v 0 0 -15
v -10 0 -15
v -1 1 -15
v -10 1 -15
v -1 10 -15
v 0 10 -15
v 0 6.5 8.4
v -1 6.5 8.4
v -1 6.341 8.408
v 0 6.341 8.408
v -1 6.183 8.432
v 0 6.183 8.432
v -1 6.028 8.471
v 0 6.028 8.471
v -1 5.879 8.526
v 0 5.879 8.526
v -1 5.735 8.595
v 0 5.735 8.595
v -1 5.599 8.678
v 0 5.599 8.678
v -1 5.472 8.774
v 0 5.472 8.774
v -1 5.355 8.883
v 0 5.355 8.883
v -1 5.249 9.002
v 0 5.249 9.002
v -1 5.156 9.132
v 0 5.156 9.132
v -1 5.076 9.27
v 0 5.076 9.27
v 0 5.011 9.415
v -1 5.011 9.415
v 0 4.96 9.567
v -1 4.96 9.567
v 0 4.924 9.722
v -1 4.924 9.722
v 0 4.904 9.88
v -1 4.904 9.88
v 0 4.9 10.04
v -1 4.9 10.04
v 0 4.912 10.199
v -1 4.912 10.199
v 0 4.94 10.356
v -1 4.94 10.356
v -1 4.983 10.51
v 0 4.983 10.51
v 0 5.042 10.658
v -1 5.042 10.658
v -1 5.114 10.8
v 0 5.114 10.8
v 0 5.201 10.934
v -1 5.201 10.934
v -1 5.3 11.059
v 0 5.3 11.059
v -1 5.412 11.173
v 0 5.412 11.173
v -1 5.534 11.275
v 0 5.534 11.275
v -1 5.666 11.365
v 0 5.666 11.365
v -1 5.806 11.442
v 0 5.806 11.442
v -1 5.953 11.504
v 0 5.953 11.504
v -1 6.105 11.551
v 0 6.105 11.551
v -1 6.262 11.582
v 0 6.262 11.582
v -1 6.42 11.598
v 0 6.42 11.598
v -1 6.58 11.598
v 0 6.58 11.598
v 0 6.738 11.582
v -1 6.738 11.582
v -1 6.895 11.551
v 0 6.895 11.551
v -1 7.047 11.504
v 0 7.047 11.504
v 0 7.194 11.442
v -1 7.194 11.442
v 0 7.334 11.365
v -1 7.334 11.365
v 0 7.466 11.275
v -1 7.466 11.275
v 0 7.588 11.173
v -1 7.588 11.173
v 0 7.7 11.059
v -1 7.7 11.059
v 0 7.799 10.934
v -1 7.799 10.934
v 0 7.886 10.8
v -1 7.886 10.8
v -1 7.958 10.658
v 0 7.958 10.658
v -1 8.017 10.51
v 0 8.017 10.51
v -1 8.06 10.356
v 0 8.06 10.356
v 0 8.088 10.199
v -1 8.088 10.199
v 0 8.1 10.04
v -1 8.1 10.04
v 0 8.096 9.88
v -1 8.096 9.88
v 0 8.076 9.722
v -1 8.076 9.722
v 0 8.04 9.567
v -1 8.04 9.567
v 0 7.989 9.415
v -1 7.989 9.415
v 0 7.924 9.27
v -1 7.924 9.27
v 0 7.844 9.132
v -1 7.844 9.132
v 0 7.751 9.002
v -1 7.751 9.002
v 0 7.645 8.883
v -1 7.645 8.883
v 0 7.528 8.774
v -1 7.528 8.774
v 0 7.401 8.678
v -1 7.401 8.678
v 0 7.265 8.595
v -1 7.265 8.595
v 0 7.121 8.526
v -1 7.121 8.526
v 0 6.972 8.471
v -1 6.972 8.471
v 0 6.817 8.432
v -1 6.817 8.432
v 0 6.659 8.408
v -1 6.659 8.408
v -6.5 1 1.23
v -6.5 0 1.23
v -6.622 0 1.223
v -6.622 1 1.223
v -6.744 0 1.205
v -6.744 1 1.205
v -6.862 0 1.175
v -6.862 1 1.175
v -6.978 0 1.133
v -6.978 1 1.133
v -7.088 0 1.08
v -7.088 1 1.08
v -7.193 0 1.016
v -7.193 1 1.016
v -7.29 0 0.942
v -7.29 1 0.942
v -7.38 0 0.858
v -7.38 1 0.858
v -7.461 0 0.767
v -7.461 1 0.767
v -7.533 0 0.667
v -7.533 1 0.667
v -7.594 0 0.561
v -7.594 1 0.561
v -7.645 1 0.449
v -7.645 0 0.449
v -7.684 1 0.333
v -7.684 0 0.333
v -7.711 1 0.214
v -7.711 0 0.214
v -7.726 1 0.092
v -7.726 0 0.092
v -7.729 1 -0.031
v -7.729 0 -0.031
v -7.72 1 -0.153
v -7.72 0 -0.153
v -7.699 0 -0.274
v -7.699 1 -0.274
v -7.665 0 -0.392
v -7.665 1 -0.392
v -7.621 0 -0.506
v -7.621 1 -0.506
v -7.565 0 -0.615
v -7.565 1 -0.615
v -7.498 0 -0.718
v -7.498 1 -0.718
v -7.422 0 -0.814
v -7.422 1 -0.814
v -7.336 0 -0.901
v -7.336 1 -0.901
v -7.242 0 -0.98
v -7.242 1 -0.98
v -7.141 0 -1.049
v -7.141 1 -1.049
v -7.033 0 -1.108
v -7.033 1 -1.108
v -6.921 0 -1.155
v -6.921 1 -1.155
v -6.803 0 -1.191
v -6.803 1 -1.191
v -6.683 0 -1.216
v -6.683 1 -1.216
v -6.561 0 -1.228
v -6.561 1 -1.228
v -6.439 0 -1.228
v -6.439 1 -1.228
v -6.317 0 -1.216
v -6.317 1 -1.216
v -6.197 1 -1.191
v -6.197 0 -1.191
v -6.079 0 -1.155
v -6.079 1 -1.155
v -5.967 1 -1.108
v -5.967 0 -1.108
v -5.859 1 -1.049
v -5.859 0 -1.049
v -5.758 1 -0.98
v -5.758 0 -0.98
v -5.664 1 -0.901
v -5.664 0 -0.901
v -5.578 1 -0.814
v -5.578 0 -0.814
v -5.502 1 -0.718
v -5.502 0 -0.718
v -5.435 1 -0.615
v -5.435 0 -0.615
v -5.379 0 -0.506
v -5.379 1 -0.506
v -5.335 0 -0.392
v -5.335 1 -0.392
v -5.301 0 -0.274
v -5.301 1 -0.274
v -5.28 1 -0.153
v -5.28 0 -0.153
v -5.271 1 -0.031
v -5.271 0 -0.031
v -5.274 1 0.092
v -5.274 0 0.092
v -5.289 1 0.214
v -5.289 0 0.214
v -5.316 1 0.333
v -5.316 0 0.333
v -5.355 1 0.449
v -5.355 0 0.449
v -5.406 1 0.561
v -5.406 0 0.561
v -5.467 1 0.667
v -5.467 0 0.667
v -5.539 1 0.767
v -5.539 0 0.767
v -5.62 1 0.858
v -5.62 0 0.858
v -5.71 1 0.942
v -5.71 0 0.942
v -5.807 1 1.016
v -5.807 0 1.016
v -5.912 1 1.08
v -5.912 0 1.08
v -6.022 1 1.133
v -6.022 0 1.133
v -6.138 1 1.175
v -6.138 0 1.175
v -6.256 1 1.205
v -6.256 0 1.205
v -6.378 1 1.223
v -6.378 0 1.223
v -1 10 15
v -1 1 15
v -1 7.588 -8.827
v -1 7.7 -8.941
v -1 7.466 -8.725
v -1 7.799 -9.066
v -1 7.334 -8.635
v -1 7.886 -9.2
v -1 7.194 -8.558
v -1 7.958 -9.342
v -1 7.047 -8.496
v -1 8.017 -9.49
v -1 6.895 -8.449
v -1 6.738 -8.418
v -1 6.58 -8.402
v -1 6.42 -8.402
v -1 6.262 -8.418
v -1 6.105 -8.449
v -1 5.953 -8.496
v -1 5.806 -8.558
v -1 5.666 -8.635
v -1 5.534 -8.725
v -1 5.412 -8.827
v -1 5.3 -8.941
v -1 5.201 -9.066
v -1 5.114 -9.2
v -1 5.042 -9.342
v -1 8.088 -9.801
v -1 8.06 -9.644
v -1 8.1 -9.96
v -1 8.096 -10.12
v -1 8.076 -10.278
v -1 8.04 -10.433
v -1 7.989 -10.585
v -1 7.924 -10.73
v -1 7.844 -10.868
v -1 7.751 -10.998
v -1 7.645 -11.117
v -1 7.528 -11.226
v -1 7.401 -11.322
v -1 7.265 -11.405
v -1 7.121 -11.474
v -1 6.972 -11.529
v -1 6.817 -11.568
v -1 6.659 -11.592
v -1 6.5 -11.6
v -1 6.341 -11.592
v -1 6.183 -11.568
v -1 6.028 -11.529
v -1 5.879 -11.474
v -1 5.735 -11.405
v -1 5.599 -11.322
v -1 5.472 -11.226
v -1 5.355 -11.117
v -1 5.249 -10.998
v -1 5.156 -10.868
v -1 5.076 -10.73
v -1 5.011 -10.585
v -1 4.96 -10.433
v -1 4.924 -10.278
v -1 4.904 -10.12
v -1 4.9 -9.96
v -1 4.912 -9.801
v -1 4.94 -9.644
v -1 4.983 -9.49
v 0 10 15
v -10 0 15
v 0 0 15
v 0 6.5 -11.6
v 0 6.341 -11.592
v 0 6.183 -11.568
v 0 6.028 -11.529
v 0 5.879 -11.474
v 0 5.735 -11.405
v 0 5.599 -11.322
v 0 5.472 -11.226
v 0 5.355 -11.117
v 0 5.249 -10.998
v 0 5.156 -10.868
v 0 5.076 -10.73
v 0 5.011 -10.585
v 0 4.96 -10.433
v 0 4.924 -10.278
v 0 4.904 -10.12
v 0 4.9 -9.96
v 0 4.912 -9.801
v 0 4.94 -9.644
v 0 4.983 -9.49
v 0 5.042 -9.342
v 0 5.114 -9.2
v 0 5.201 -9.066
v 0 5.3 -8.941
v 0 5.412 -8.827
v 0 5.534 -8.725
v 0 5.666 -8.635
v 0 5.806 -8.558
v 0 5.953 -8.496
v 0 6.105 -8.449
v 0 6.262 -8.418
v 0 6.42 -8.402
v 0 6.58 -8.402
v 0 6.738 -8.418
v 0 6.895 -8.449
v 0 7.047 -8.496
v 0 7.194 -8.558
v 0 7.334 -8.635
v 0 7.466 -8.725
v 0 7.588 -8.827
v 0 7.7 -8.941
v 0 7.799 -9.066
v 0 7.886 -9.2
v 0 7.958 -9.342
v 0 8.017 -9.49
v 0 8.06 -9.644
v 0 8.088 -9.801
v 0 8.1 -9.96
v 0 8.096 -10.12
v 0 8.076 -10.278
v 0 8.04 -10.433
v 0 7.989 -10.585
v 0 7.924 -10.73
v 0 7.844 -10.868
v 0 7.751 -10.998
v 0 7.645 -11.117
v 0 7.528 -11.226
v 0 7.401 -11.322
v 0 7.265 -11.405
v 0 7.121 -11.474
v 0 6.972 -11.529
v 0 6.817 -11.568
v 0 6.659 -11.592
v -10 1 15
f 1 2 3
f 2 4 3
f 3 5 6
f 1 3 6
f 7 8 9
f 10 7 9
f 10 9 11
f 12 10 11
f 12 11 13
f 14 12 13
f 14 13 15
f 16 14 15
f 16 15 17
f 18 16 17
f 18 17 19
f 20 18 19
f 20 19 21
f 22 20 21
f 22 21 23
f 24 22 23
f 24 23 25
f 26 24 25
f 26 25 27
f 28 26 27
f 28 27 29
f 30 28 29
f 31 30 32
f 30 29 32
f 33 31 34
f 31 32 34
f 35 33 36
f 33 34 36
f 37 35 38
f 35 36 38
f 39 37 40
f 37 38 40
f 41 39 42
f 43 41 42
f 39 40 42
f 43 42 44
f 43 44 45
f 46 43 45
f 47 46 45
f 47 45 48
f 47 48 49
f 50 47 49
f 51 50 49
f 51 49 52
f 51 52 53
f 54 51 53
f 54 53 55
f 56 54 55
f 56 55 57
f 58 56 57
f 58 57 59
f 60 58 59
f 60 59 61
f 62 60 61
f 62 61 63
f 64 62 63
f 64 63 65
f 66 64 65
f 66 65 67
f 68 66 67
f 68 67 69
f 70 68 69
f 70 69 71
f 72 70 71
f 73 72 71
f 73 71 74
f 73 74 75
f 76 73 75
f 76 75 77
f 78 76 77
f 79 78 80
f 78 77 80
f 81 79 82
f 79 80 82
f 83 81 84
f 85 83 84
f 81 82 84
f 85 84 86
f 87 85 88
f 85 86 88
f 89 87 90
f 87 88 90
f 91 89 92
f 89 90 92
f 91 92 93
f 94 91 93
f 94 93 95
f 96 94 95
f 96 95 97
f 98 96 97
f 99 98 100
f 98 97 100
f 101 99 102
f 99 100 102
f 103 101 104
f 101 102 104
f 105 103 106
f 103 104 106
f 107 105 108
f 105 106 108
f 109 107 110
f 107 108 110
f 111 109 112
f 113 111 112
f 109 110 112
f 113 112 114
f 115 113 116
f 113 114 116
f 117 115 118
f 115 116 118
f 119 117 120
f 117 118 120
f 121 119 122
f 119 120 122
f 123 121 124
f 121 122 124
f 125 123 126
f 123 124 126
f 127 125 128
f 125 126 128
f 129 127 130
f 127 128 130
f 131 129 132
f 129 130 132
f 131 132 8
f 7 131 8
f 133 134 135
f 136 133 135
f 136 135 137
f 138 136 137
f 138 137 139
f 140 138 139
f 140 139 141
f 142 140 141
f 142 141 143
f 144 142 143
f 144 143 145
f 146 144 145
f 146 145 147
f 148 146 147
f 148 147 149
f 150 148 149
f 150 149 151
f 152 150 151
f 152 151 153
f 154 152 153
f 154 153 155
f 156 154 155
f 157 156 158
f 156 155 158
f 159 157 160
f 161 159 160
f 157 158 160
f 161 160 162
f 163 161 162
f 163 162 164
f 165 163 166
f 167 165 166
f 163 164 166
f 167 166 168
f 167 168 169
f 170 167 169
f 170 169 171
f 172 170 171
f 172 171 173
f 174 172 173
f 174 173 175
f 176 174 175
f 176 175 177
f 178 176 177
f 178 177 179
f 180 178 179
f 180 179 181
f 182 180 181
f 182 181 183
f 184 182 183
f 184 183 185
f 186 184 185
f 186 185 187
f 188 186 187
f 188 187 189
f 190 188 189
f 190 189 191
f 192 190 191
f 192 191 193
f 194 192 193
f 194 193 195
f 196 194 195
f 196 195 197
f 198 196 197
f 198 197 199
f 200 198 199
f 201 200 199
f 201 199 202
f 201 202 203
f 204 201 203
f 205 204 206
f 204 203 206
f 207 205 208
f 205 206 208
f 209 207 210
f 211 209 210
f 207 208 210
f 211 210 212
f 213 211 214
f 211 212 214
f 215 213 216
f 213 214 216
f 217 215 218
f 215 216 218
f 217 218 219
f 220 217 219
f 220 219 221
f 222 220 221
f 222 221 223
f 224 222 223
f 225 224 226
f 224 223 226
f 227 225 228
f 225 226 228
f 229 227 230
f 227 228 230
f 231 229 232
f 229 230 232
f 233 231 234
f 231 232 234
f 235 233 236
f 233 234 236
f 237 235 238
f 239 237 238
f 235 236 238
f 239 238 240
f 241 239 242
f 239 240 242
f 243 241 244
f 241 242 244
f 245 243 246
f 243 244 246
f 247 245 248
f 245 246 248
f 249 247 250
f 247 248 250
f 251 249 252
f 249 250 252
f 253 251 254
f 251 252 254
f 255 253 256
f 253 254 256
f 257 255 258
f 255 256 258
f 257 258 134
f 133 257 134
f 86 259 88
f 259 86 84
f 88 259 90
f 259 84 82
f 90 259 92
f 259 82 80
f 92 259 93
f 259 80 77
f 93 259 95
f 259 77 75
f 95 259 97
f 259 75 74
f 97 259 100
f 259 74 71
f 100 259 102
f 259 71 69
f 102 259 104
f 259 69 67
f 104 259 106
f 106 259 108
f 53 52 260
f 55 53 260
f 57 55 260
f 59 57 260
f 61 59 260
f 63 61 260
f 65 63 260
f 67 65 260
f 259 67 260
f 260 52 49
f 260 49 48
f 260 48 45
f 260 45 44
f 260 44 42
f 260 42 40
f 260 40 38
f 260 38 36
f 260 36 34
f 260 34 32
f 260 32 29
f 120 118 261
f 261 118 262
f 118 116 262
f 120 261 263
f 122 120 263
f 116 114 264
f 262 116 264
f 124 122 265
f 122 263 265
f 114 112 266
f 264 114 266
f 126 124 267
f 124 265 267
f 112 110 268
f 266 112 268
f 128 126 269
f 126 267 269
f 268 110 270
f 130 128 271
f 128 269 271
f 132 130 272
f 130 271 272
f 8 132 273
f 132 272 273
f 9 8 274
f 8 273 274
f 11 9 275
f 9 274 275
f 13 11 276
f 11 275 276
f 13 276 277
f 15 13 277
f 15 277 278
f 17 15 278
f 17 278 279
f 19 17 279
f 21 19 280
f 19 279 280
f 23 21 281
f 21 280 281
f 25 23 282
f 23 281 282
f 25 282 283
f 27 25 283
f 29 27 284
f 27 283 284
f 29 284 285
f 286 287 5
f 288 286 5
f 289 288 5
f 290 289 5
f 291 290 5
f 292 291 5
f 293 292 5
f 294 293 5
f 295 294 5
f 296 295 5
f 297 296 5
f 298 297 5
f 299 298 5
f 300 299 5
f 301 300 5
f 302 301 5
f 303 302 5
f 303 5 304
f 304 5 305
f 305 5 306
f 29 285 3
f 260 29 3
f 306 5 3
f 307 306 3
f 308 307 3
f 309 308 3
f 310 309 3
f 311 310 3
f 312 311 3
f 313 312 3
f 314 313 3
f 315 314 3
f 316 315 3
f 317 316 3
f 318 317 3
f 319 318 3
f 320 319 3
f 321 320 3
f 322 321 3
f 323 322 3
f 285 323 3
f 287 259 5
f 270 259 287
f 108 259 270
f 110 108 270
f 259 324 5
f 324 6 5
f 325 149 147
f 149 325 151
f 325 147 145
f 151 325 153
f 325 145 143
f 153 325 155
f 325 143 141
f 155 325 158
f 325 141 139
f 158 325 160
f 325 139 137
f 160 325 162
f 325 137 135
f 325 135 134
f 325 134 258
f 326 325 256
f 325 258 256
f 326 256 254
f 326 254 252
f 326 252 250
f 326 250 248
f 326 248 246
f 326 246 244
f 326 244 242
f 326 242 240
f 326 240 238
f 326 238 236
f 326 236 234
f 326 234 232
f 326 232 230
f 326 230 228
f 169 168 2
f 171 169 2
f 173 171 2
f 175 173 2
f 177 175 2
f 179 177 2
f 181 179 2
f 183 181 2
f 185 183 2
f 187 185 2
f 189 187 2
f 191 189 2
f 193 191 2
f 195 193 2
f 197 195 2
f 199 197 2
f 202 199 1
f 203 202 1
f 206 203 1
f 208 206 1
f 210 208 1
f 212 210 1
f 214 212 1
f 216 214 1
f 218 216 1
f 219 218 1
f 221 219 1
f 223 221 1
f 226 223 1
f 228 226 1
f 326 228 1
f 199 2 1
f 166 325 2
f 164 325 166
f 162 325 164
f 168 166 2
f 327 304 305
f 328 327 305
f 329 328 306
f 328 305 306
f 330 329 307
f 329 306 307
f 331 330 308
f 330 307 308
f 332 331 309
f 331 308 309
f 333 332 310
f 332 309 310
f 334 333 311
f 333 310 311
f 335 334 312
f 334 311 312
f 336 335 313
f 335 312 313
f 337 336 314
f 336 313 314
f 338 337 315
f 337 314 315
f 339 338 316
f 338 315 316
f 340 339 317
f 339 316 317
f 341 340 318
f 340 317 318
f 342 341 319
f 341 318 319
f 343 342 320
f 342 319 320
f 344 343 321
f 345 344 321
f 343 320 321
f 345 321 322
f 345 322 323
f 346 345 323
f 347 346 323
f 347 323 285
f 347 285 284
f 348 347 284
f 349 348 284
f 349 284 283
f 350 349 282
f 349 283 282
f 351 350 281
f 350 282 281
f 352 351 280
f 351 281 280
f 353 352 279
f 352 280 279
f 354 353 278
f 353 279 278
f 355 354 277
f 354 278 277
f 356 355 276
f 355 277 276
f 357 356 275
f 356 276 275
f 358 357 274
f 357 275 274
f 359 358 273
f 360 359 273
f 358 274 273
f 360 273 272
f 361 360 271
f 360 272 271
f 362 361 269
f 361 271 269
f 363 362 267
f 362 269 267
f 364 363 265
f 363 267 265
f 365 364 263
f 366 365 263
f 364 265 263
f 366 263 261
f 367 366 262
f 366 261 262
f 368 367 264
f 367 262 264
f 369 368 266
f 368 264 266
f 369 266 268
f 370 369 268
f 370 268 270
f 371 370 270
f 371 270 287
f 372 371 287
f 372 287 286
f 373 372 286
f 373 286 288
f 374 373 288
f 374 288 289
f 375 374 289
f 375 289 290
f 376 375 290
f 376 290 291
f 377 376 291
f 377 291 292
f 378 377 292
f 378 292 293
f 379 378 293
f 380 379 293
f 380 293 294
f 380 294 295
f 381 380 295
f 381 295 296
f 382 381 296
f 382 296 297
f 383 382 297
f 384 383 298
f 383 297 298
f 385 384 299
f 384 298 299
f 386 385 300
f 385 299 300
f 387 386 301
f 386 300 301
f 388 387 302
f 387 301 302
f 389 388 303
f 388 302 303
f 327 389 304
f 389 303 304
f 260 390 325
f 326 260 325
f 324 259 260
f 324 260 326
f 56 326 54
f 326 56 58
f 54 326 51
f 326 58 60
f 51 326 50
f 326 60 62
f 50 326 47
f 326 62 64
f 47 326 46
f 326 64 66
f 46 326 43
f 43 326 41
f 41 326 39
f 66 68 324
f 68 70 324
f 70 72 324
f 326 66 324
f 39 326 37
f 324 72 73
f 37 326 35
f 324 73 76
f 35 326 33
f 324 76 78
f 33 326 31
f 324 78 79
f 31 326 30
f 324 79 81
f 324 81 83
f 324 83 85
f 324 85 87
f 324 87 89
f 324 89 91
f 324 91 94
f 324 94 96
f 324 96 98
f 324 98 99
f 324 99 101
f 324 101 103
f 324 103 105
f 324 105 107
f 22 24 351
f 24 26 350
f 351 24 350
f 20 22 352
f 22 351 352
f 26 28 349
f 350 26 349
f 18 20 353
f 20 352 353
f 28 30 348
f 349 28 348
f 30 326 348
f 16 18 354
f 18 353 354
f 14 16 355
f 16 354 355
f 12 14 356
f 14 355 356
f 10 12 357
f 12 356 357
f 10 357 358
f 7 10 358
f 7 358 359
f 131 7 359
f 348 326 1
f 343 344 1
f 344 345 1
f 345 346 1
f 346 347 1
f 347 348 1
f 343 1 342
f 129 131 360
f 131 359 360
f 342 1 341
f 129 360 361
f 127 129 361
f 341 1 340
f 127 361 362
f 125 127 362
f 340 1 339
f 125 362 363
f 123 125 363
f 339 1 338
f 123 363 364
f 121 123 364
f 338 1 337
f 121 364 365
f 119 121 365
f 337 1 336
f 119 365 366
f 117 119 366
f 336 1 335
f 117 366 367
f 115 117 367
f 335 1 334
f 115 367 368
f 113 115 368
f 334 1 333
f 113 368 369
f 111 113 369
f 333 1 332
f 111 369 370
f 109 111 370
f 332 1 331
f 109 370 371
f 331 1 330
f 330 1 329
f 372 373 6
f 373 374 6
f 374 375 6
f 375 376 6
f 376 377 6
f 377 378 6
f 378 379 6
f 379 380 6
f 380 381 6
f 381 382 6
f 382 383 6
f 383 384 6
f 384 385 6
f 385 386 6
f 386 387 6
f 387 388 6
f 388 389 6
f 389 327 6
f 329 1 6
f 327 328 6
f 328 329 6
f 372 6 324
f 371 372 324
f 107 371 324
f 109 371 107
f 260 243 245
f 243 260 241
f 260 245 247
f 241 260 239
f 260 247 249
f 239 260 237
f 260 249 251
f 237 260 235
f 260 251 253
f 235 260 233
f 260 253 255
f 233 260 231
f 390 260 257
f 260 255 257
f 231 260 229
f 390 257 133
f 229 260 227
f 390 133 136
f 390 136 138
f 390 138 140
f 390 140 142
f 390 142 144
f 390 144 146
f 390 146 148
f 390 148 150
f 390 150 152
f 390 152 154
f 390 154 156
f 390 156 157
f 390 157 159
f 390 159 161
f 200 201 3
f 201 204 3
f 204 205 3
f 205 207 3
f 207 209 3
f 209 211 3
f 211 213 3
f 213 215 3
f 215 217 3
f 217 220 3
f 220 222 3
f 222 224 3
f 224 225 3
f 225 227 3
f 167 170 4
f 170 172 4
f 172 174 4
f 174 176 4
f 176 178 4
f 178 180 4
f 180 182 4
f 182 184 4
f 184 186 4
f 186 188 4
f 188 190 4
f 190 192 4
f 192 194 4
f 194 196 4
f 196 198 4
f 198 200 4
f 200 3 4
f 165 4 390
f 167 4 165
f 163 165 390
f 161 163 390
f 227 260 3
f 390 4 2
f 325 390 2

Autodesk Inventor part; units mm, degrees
ref_plane "YZ Plane" through (0, 0, 0) normal (1, 0, 0) x (0, 1, 0)
ref_plane "XZ Plane" through (0, 0, 0) normal (0, 1, 0) x (-1, 0, 0)
ref_plane "XY Plane" through (0, 0, 0) normal (0, 0, 1) x (1, 0, 0)
sketch "Náčrt1" plane through (0, 0, 0) normal (0, 0, 1) x (1, 0, 0)
  line L0 (-10, 0) -> (0, 0)
  line L1 (0, 0) -> (0, 10)
  line L2 (0, 10) -> (-1, 10)
  line L3 (-1, 10) -> (-1, 1)
  line L4 (-1, 1) -> (-10, 1)
  line L5 (-10, 1) -> (-10, 0)
  line L6 (0, 12) -> (0, -2) projected
  line L7 (-12, 0) -> (2, 0) projected
  point P0 (0, 0)
  dimension "d0" = 10
  dimension "d1" = 10
  dimension "d2" = 1
  dimension "d3" = 1
extrude "Vysunutí1" add sketch "Náčrt1" along normal mid plane 30
sketch "Náčrt2" plane through (0, 0, 15) normal (1, 0, 0) x (0, 0, -1)
  line L0 (30, 10) -> (0, 10) projected
  line L1 (30, 10) -> (30, 0) projected
  point P0 (15, 0)
  point P1 (5, 6.5)
  point P2 (25, 6.5)
  point P3 (30, 5)
  dimension "d6" = 3.5
  dimension "d7" = 3.5
  dimension "d8" = 20
  dimension "d9" = 5
hole "Díra1" at (0, 6.5, 10) at (0, 6.5, -10) direction (-1, 0, 0) diameter 3.2 end through all
sketch "Náčrt3" plane through (-10, 1, 15) normal (0, 1, 0) x (1, 0, 0)
  line L0 (0, 0) -> (0, 30) projected
  line L1 (0, 0) -> (0, 30) projected
  line L2 (9, 0) -> (0, 0) projected
  line L3 (9, 30) -> (9, 0) projected
  line L4 (0, 30) -> (9, 30) projected
  point P0 (10, 15)
  point P1 (3.5, 15)
  dimension "d17" = 3.5
  dimension "d18" = 15
hole "Díra2" at (-6.5, 1, 0) direction (0, -1, 0) diameter 2.459 end through all thread size "M3x0.5" class "6H" standard "ISO Metric profile"
properties part number "y_cable_adaptor_holder" material "Hliník 6061"
